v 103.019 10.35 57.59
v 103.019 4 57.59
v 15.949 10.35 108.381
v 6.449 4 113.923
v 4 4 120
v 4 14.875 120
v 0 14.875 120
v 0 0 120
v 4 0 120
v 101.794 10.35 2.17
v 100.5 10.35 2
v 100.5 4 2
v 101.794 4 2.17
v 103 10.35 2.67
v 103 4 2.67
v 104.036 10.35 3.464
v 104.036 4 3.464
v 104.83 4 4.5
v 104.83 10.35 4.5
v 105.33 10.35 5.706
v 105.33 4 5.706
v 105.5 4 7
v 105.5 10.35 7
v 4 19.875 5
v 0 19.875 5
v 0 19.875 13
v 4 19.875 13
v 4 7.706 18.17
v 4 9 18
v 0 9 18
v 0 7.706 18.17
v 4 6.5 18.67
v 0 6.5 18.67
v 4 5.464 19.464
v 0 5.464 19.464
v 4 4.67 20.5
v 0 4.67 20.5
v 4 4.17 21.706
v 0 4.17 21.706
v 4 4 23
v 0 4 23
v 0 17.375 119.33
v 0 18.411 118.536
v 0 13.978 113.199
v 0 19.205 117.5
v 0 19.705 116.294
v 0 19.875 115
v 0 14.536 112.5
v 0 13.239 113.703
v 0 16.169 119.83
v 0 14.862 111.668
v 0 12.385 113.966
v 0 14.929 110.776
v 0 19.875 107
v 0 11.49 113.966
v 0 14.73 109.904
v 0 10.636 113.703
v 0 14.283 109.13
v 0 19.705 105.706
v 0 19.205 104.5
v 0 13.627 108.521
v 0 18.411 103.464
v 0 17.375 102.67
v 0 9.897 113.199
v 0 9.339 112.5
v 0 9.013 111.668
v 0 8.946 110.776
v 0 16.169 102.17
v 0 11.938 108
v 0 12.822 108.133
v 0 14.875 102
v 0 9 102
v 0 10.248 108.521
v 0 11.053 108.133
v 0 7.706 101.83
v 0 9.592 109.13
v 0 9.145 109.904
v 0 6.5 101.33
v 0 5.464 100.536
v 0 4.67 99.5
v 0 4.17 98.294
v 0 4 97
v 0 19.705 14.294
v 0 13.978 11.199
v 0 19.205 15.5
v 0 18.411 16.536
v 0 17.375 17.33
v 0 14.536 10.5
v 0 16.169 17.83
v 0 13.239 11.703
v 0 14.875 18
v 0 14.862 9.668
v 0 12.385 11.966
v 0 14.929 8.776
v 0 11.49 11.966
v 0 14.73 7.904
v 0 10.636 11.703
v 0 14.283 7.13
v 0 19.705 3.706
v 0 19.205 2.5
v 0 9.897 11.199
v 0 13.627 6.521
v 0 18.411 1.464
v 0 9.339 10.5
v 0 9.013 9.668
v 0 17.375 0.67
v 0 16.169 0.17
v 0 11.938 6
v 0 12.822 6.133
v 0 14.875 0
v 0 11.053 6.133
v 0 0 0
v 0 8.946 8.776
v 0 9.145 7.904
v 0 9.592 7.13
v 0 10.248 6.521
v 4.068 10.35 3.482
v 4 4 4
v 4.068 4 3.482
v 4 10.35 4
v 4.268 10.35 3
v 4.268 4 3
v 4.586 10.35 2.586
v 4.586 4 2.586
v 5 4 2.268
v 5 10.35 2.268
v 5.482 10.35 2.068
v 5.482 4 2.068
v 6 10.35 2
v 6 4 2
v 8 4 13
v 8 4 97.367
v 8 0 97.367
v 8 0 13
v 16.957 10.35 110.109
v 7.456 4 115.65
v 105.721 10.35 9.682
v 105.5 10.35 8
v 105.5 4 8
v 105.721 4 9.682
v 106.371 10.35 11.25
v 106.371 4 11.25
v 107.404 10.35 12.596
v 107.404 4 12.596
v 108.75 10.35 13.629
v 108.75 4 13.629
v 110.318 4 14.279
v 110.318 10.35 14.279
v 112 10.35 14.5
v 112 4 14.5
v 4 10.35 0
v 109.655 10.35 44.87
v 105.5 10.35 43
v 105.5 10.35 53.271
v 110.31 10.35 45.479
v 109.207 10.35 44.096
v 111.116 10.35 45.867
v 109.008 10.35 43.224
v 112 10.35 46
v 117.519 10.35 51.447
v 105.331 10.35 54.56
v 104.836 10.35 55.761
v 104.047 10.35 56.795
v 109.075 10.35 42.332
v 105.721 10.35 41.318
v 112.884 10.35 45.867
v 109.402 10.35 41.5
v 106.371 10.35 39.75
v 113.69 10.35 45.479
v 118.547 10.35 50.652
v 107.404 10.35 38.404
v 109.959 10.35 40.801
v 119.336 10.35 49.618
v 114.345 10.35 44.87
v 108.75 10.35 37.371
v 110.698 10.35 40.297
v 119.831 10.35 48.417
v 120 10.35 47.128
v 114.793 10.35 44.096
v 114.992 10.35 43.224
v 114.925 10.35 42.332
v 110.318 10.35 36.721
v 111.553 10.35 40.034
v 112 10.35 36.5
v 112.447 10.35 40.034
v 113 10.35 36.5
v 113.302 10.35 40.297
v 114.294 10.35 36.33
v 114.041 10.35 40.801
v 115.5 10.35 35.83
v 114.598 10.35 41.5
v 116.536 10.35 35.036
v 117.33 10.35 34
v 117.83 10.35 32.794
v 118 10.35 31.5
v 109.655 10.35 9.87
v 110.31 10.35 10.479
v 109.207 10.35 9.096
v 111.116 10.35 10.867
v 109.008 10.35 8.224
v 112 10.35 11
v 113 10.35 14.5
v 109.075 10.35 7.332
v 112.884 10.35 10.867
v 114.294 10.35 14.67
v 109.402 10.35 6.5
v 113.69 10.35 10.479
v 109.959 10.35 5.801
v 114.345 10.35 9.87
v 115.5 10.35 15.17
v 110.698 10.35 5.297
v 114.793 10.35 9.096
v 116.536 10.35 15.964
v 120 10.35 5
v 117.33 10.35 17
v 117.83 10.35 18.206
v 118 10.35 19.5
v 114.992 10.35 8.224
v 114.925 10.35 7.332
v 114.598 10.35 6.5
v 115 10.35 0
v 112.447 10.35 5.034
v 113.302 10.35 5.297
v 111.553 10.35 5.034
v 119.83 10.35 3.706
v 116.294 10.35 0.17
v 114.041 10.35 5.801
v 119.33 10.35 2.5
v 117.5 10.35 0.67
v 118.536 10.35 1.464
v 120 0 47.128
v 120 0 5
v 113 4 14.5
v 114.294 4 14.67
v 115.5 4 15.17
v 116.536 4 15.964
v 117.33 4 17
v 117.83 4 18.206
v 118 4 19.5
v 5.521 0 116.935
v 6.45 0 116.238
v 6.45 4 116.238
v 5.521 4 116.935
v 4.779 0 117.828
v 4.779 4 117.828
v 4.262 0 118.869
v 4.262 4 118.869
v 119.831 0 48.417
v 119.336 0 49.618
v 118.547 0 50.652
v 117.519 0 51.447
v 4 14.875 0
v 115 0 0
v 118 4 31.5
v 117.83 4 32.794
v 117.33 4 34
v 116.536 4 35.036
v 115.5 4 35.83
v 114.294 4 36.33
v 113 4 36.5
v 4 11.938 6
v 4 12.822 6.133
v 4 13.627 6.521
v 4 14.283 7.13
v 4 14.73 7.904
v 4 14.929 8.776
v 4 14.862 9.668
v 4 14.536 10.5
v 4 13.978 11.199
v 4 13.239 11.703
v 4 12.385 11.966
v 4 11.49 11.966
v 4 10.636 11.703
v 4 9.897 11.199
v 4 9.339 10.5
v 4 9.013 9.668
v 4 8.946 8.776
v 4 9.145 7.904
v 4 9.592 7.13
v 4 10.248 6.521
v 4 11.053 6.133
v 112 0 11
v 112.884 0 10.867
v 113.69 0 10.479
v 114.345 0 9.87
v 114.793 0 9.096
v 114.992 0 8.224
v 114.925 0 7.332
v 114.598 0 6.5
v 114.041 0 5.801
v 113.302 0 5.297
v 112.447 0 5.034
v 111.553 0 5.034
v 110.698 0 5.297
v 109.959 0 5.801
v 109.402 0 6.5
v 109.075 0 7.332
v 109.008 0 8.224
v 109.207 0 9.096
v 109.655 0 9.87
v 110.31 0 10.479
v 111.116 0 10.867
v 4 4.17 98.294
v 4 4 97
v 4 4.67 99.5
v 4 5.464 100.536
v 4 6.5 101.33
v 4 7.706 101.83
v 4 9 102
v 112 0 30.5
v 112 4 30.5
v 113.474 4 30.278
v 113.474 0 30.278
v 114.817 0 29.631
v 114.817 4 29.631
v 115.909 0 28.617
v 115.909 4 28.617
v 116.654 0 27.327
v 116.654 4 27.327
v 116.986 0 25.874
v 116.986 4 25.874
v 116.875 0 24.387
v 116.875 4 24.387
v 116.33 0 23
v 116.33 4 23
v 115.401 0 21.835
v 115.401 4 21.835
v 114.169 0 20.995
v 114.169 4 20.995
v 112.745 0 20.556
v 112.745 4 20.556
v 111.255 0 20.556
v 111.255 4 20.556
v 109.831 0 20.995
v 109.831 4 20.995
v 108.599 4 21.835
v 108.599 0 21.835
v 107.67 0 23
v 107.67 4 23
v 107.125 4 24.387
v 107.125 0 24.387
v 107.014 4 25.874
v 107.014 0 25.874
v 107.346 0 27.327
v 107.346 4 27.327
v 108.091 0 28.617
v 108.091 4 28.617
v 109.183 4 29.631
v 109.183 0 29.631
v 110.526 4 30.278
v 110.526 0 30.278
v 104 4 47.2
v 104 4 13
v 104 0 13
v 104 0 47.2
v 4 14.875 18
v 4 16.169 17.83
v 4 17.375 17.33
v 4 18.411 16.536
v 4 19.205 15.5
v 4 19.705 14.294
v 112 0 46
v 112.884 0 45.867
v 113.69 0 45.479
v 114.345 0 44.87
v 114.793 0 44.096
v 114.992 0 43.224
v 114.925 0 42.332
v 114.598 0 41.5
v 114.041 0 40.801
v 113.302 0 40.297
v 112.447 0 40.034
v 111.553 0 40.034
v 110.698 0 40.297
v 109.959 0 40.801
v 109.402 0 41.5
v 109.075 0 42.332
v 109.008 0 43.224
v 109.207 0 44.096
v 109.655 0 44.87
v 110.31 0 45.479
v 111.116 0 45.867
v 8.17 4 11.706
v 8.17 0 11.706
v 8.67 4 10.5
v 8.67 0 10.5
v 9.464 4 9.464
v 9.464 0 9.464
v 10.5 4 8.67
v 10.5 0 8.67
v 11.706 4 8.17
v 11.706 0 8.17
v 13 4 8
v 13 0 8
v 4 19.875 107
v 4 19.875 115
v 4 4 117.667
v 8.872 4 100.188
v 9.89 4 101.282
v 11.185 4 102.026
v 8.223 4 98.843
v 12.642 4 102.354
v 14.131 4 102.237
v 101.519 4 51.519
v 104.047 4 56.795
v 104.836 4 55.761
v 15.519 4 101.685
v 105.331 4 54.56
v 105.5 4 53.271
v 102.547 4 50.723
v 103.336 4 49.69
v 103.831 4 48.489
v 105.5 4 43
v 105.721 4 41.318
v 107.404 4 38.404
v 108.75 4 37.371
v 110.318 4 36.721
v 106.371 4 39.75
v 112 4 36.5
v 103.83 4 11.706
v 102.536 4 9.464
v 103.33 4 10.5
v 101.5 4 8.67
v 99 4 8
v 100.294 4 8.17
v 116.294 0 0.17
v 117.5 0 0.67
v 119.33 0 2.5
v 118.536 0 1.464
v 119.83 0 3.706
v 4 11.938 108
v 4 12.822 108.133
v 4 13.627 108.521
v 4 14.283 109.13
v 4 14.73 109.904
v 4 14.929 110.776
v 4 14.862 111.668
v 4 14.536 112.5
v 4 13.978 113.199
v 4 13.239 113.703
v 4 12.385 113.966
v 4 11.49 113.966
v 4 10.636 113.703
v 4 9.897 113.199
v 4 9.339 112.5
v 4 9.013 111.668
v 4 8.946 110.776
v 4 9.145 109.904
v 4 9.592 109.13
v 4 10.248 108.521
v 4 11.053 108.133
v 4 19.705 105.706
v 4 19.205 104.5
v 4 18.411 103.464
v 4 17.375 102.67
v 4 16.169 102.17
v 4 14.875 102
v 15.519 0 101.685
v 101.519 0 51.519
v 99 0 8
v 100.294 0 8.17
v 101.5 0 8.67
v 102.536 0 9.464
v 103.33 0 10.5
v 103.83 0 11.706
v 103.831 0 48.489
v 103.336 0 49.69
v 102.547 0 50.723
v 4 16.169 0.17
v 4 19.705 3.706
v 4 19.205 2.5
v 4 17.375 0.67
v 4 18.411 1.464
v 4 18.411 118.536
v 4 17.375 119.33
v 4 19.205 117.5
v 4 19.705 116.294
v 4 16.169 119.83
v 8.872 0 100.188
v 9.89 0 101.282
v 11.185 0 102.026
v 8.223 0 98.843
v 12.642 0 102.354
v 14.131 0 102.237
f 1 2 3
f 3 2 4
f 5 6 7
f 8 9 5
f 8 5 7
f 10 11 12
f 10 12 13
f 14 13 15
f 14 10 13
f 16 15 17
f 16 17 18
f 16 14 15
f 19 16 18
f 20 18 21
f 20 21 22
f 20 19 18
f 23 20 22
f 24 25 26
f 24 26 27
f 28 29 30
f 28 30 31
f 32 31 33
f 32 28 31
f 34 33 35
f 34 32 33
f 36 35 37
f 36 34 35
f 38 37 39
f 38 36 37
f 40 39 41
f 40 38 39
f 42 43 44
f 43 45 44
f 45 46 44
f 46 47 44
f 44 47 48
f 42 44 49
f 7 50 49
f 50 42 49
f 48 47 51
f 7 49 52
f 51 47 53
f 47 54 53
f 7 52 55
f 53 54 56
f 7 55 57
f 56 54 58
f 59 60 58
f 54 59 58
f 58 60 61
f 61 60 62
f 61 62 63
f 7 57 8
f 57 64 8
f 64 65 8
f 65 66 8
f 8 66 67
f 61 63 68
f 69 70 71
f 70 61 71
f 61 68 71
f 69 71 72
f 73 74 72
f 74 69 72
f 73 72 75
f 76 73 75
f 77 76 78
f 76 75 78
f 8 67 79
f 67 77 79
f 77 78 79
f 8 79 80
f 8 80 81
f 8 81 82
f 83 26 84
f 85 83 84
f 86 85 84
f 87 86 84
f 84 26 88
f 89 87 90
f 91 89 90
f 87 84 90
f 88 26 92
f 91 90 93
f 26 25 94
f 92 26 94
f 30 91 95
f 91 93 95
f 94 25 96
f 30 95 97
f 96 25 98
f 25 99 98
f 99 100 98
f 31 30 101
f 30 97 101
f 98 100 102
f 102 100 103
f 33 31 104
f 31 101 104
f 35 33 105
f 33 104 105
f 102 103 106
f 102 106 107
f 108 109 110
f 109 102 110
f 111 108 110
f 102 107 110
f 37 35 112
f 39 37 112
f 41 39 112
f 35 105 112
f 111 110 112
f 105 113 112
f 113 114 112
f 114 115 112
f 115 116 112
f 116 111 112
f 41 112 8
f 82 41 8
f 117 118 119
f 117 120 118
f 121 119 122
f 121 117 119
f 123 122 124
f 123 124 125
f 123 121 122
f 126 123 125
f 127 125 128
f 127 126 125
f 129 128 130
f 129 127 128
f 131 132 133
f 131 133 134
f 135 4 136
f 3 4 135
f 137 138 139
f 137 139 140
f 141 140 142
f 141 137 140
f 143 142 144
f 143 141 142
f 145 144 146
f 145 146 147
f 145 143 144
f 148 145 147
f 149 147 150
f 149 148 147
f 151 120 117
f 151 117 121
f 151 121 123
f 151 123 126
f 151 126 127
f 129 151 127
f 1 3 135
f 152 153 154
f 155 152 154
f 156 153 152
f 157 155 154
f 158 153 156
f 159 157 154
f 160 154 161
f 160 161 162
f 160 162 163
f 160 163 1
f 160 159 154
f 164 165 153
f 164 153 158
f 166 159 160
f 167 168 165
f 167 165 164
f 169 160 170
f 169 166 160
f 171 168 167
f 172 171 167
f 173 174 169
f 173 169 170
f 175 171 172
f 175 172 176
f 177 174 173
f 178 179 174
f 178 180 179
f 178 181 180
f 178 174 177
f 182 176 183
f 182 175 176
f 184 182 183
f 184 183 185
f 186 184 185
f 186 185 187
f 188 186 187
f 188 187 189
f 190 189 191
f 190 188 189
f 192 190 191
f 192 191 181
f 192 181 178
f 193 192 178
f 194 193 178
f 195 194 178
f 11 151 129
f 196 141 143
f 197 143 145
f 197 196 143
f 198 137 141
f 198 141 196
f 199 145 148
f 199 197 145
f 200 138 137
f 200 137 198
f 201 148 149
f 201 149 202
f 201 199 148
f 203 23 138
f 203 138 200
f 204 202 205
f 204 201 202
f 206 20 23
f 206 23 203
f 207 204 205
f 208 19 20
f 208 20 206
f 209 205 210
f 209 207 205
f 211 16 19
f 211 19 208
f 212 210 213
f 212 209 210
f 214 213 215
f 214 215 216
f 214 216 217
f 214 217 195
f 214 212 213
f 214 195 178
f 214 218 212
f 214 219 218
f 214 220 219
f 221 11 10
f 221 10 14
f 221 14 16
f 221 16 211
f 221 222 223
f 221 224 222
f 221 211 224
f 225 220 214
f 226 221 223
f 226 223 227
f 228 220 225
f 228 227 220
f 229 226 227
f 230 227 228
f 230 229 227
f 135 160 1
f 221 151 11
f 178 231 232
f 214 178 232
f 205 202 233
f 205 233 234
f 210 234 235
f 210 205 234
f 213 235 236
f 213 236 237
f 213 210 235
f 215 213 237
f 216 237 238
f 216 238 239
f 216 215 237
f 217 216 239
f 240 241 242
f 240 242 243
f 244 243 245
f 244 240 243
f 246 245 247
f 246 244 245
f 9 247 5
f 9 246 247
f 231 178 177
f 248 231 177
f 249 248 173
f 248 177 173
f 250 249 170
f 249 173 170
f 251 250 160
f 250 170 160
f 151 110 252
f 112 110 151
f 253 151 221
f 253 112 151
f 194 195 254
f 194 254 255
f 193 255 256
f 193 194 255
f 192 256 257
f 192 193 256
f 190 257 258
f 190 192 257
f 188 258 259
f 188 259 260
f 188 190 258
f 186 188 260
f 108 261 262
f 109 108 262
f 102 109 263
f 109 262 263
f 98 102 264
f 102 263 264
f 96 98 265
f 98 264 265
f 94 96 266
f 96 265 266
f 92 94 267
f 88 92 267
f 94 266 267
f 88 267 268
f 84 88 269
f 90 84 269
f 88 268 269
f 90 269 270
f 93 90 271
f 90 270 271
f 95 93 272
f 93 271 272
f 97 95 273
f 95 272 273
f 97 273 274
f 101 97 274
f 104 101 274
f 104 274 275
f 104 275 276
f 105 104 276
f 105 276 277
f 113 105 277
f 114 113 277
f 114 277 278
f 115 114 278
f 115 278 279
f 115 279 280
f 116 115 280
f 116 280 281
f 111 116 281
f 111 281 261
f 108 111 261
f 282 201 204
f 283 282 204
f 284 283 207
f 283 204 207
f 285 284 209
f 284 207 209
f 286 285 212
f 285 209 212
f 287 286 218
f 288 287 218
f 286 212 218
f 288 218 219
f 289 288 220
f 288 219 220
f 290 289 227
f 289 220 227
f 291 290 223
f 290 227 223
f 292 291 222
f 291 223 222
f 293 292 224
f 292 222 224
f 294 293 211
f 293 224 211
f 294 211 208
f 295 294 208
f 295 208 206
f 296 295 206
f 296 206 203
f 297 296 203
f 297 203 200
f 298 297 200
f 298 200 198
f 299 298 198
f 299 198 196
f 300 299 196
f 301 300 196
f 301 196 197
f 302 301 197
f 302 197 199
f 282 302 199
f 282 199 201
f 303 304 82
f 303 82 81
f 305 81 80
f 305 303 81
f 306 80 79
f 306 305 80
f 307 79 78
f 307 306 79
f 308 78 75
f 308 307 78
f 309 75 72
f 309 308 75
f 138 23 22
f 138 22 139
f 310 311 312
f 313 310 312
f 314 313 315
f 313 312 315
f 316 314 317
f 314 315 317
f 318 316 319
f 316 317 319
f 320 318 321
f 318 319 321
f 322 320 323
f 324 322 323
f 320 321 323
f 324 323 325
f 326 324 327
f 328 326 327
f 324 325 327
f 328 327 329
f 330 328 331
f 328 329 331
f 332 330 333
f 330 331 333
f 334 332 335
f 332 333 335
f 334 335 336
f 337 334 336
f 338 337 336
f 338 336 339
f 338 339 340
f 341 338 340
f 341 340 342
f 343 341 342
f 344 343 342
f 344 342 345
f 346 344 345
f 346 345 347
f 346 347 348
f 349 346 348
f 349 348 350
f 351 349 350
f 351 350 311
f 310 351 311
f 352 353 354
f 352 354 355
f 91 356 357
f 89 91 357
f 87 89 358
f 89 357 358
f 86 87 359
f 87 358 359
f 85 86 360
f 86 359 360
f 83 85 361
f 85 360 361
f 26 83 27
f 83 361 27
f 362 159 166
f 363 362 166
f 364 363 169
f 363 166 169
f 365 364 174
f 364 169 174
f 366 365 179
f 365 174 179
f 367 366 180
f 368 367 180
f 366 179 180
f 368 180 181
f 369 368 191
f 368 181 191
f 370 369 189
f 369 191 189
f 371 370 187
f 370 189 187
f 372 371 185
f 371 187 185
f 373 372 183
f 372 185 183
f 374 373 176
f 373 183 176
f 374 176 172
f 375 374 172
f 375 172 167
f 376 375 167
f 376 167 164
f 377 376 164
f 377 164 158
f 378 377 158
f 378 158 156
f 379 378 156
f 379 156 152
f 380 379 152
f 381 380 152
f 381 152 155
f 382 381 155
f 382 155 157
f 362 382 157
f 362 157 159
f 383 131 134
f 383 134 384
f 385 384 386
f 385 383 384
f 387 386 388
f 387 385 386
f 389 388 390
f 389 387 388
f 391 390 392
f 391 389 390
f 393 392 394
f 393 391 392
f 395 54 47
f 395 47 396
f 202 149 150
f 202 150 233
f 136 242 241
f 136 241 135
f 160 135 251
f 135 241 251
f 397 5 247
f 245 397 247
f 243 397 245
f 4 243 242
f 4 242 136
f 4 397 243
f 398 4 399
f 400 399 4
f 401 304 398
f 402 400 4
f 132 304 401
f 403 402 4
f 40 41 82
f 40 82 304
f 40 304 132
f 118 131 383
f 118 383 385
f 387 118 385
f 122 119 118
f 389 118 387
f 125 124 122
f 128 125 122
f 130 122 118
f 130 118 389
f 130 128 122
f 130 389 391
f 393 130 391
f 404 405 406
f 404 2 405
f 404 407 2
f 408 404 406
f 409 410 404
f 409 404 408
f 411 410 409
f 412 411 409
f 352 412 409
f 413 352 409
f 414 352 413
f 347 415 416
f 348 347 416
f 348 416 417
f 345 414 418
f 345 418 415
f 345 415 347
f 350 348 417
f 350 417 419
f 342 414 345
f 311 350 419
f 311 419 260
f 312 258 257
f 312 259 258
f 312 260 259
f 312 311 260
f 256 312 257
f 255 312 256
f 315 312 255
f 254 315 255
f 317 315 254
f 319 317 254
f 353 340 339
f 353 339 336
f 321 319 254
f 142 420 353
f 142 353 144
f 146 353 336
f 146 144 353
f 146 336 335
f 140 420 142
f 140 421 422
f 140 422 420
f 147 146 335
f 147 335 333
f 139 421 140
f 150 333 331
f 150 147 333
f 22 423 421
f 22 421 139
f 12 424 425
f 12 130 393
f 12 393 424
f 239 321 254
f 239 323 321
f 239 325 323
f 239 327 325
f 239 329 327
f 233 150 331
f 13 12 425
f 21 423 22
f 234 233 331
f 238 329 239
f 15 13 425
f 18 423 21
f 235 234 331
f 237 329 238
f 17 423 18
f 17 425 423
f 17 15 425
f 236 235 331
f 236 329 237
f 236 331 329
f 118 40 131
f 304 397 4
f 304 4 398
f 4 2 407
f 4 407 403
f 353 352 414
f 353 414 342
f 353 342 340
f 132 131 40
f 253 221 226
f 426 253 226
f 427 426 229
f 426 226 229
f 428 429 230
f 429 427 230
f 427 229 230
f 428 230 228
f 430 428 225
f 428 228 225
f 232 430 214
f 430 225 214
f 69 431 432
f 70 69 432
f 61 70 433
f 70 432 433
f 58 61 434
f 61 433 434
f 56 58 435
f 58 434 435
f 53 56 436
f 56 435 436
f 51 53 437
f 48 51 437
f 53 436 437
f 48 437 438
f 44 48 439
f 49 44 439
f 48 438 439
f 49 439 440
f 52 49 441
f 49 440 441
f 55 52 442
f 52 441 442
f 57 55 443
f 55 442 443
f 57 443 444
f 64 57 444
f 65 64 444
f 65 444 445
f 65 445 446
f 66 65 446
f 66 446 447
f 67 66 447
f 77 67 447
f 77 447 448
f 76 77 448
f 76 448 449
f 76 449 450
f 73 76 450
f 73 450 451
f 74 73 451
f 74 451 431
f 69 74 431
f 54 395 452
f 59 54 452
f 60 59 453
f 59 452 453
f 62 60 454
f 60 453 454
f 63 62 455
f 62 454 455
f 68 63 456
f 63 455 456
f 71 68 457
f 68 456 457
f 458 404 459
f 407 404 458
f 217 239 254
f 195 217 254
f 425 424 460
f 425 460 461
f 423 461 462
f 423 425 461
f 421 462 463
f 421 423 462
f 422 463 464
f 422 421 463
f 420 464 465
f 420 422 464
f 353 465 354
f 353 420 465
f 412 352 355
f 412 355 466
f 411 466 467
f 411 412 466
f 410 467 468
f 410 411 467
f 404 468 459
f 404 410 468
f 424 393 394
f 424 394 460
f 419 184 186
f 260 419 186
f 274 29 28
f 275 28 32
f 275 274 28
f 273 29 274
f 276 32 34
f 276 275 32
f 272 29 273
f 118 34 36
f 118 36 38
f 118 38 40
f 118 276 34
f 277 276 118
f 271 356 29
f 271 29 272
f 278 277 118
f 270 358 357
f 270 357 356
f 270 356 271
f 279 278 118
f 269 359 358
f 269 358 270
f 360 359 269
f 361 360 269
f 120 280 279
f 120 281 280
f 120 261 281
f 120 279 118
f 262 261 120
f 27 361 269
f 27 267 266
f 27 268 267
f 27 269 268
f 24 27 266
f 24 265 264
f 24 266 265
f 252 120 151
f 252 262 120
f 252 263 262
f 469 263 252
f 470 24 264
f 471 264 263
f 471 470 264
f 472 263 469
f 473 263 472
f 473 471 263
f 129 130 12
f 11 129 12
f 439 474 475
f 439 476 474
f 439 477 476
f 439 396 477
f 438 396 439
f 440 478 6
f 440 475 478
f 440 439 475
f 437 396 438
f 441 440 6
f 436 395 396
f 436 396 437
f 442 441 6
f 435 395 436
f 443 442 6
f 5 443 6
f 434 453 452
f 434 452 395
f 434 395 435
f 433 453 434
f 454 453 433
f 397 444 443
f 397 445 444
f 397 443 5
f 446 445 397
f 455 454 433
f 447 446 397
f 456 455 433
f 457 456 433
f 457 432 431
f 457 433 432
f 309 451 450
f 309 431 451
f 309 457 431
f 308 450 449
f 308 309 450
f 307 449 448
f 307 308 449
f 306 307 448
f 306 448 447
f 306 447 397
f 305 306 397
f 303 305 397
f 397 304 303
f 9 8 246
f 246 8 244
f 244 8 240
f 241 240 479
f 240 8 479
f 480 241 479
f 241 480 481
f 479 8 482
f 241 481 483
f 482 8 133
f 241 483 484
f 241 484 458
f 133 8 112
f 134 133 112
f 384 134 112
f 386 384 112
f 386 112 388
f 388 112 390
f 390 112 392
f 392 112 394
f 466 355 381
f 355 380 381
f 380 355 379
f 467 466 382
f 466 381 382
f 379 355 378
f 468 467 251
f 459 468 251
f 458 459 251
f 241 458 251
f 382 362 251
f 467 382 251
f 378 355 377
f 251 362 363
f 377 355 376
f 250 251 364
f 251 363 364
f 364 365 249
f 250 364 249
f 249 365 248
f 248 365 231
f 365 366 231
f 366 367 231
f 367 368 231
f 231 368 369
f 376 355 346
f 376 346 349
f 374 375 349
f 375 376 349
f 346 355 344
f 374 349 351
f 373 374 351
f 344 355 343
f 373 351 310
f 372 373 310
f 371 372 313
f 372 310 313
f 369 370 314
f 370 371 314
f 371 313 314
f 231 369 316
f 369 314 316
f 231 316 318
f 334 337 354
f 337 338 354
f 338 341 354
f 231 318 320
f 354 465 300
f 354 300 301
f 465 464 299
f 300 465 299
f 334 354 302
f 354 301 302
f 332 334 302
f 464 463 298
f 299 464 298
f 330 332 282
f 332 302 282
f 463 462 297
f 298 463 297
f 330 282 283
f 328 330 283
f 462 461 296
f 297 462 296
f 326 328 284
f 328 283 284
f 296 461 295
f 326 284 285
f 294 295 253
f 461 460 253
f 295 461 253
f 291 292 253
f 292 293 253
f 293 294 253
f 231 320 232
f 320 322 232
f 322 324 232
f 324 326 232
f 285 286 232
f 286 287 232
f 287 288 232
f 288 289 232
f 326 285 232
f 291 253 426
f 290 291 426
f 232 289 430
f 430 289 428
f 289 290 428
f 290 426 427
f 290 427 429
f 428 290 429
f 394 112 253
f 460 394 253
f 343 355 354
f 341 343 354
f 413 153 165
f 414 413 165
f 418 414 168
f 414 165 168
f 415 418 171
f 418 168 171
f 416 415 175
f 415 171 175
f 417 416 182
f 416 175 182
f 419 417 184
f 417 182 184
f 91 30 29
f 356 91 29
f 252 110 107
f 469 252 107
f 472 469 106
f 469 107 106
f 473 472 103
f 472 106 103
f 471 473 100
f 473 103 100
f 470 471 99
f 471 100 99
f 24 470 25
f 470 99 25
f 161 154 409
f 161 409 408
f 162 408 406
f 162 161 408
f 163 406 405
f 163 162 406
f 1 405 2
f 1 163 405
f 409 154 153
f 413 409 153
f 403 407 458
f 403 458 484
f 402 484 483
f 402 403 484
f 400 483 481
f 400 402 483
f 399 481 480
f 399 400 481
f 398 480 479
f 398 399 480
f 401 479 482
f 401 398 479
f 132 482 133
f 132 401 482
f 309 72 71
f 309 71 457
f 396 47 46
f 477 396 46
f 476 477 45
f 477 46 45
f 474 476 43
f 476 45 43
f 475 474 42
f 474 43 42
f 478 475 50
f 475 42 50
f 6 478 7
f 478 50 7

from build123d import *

# Parameters (mm, degrees)
BOSS_EXTRUDE1_DEPTH = 4
SKETCH2_R           = 3
CUT_EXTRUDE3_DEPTH  = 170.752761391
BOSS_EXTRUDE3_DEPTH = 6.35
CHAMFER1_SIZE       = 8.660254038
CHAMFER1_SIZE_2     = 15
BOSS_EXTRUDE4_START = 6.35
SKETCH8_R           = 3
BOSS_EXTRUDE4_DEPTH = 6.35
SKETCH9_W           = 4
SKETCH9_H           = 18
BOSS_EXTRUDE5_DEPTH = 15.875
SKETCH10_R          = 3
CUT_EXTRUDE4_DEPTH  = 110.875
FILLET3_R           = 5
SKETCH11_R          = 5
CUT_EXTRUDE5_DEPTH  = 15.875
FILLET4_R           = 2


with BuildPart() as part:
    # Sketch1 → Boss-Extrude1 (new body)
    with BuildSketch(Plane(origin=(0, 0, 0), x_dir=(1, 0, 0), z_dir=(0, 1, 0))):
        Polygon((0, 0), (120, 0), (120, -50), (4, -117.666666667), (4, -120), (0, -120), align=None)
    extrude(amount=BOSS_EXTRUDE1_DEPTH)

    # Sketch2 → Cut-Extrude3 (cut, through all)
    with BuildSketch(Plane(origin=(0, 4, 0), x_dir=(1, 0, 0), z_dir=(0, 1, 0))):
        with Locations(Location((112, -8, 0), (0, 0, 270))):
            Circle(SKETCH2_R)
        with Locations(Location((112, -43, 0), (0, 0, 270))):
            Circle(SKETCH2_R)
        Polygon((104, -8), (104, -50.071704007), (8, -106.071704007), (8, -8), align=None)
    extrude(amount=-CUT_EXTRUDE3_DEPTH, mode=Mode.SUBTRACT)

    # Sketch7 → Boss-Extrude3 (add)
    with BuildSketch(Plane(origin=(0, 4, 0), x_dir=(1, 0, 0), z_dir=(0, 1, 0))):
        Polygon((118, -48.851259335), (2.992257949, -115.939108865), (4, -117.666666667), (120, -50), (120, 0), (2.992257949, 0), (2.992257949, -2), (118, -2), align=None)
    extrude(amount=BOSS_EXTRUDE3_DEPTH)

    # Chamfer1
    # the kernel refuses this chamfer: 15, 8.660254038 mm, written as the material it takes off along each edge
    with BuildSketch(Plane(origin=(-16.561105336, 10.35, 82.41905752), x_dir=(0, -1, 0), z_dir=(0.5038710255240854, 0, 0.863778900898434))) as chamfer1_piece_1_section:
        Polygon((CHAMFER1_SIZE, 0), (0, CHAMFER1_SIZE_2), (0, 0), align=None)
    chamfer1_piece_1 = extrude(amount=79.612572639, mode=Mode.PRIVATE)
    chamfer1_piece_1 = split(chamfer1_piece_1, bisect_by=Plane(origin=(-16.561105336, 4, 82.41905752), z_dir=(0, 1, 0)), keep=Keep.TOP, mode=Mode.PRIVATE)
    add(chamfer1_piece_1, mode=Mode.SUBTRACT)

    # Sketch8 → Boss-Extrude4 (add)
    # profile 1 of 2: a face of its own
    with BuildSketch(Plane(origin=(0, 4, 0), x_dir=(1, 0, 0), z_dir=(0, 1, 0)).offset(BOSS_EXTRUDE4_START)):
        with BuildLine():
            Line((112, -14.5), (118, -14.5))
            Line((118, -14.5), (118, -2))
            Line((118, -2), (105.5, -2))
            Line((105.5, -2), (105.5, -8))
            ThreePointArc((105.5, -8), (107.403805922, -12.596194078), (112, -14.5))
        make_face()
        with Locations(Location((112, -8, 0), (0, 0, 270))):
            Circle(SKETCH8_R, mode=Mode.SUBTRACT)
    # profile 2 of 2: a face of its own
    with BuildSketch(Plane(origin=(0, 4, 0), x_dir=(1, 0, 0), z_dir=(0, 1, 0)).offset(BOSS_EXTRUDE4_START)):
        with BuildLine():
            Line((112, -36.5), (118, -36.5))
            Line((118, -36.5), (118, -48.851259335))
            Line((118, -48.851259335), (105.5, -56.142926002))
            Line((105.5, -56.142926002), (105.5, -43))
            ThreePointArc((105.5, -43), (107.403805922, -38.403805922), (112, -36.5))
        make_face()
        with Locations(Location((112, -43, 0), (0, 0, 270))):
            Circle(SKETCH8_R, mode=Mode.SUBTRACT)
    extrude(amount=-BOSS_EXTRUDE4_DEPTH)

    # Sketch9 → Boss-Extrude5 (add)
    with BuildSketch(Plane(origin=(0, 4, 0), x_dir=(1, 0, 0), z_dir=(0, 1, 0))):
        with Locations((2, -9)):
            Rectangle(SKETCH9_W, SKETCH9_H)
        with Locations((2, -111)):
            Rectangle(SKETCH9_W, SKETCH9_H)
    extrude(amount=BOSS_EXTRUDE5_DEPTH)

    # Sketch10 → Cut-Extrude4 (cut)
    with BuildSketch(Plane(origin=(4, 0, 0), x_dir=(0, 0, -1), z_dir=(1, 0, 0))):
        with Locations((-9, 11.9375)):
            Circle(SKETCH10_R)
        with Locations((-111, 11.9375)):
            Circle(SKETCH10_R)
    extrude(amount=-CUT_EXTRUDE4_DEPTH, mode=Mode.SUBTRACT)

    # Fillet3
    # the kernel refuses this fillet: 5 mm, written as the material it adds along each edge
    with BuildSketch(Plane(origin=(105.5, 10.35, 56.142926002), x_dir=(-0.863778900898437, 0, 0.50387102552408), z_dir=(0, -1, 0))) as fillet3_piece_1:
        with BuildLine():
            CenterArc((FILLET3_R * 0.574370332454, FILLET3_R), FILLET3_R, 210.256437164, 59.743562836)
            Line((-FILLET3_R * 0.289408568444, FILLET3_R * 0.496128974476), (0, 0))
            Line((0, 0), (FILLET3_R * 0.574370332454, 0))
        make_face()
    extrude(amount=6.35)
    with BuildSketch(Plane(origin=(118, 10.35, 36.5), x_dir=(-1, 0, 0), z_dir=(0, -1, 0))) as fillet3_piece_2:
        with BuildLine():
            CenterArc((FILLET3_R, FILLET3_R), FILLET3_R, 180, 90)
            Line((0, FILLET3_R), (0, 0))
            Line((0, 0), (FILLET3_R, 0))
        make_face()
    extrude(amount=6.35)
    with BuildSketch(Plane(origin=(118, 10.35, 14.5), x_dir=(-1, 0, 0), z_dir=(0, -1, 0)), Plane(origin=(105.5, 10.35, 2), x_dir=(-1, 0, 0), z_dir=(0, -1, 0))) as fillet3_piece_3:
        with BuildLine():
            CenterArc((FILLET3_R, -FILLET3_R), FILLET3_R, 90, 90)
            Line((0, -FILLET3_R), (0, 0))
            Line((0, 0), (FILLET3_R, 0))
        make_face()
    extrude(amount=6.35)
    with BuildSketch(Plane(origin=(4, 0, 117.666666667), x_dir=(0.863778900898435, 0, -0.5038710255240835), z_dir=(0, 1, 0))) as fillet3_piece_4:
        with BuildLine():
            CenterArc((2.835867325, -5), FILLET3_R, 90, 53.351575298)
            Line((-1.17569906, -2.015484102), (0, 0))
            Line((0, 0), (2.835867325, 0))
        make_face()
    extrude(amount=4)
    with BuildSketch(Plane(origin=(8, 4, 106.071704007), x_dir=(0.8637789008984339, 0, -0.5038710255240852), z_dir=(0, -1, 0))) as fillet3_piece_5:
        with BuildLine():
            CenterArc((FILLET3_R * 1.74103699912, -FILLET3_R), FILLET3_R, 90, 120.256437164)
            Line((FILLET3_R * 0.877258098222, -FILLET3_R * 1.50387102552), (0, 0))
            Line((0, 0), (FILLET3_R * 1.74103699912, 0))
        make_face()
    extrude(amount=4)
    with BuildSketch(Plane(origin=(104, 4, 50.071704007), x_dir=(-0.8637789008984337, 0, 0.5038710255240859), z_dir=(0, -1, 0))) as fillet3_piece_6:
        with BuildLine():
            CenterArc((FILLET3_R * 0.574370332454, FILLET3_R), FILLET3_R, 210.256437164, 59.743562836)
            Line((-FILLET3_R * 0.289408568444, FILLET3_R * 0.496128974476), (0, 0))
            Line((0, 0), (FILLET3_R * 0.574370332454, 0))
        make_face()
    extrude(amount=4)
    with BuildSketch(Plane(origin=(104, 4, 8), x_dir=(-1, 0, 0), z_dir=(0, -1, 0)), Plane(origin=(8, 4, 8), x_dir=(0, 0, 1), z_dir=(0, -1, 0))) as fillet3_piece_7:
        with BuildLine():
            CenterArc((FILLET3_R, -FILLET3_R), FILLET3_R, 90, 90)
            Line((0, -FILLET3_R), (0, 0))
            Line((0, 0), (FILLET3_R, 0))
        make_face()
    extrude(amount=4)
    with BuildSketch(Plane(origin=(4, 4, 102), x_dir=(0, 1, 0), z_dir=(-1, 0, 0)), Plane(origin=(4, 4, 18), x_dir=(0, 0, 1), z_dir=(-1, 0, 0))) as fillet3_piece_8:
        with BuildLine():
            CenterArc((FILLET3_R, FILLET3_R), FILLET3_R, 180, 90)
            Line((0, FILLET3_R), (0, 0))
            Line((0, 0), (FILLET3_R, 0))
        make_face()
    extrude(amount=4)
    # the kernel refuses this fillet: 5 mm, written as the material it takes off along each edge
    with BuildSketch(Plane(origin=(120, 22.85, 0), x_dir=(-1, 0, 0), z_dir=(0, -1, 0))) as fillet3_2_piece_1:
        with BuildLine():
            CenterArc((FILLET3_R, -FILLET3_R), FILLET3_R, 90, 90)
            Line((0, -FILLET3_R), (0, 0))
            Line((0, 0), (FILLET3_R, 0))
        make_face()
    extrude(amount=35.35, mode=Mode.SUBTRACT)
    with BuildSketch(Plane(origin=(120, 17.529629156, 50), x_dir=(0, 0, -1), z_dir=(0, -1, 0))) as fillet3_2_piece_2:
        with BuildLine():
            CenterArc((FILLET3_R * 0.574370332454, -FILLET3_R), FILLET3_R, 90, 59.743562836)
            Line((-FILLET3_R * 0.289408568444, -FILLET3_R * 0.496128974476), (0, 0))
            Line((0, 0), (FILLET3_R * 0.574370332454, 0))
        make_face()
    extrude(amount=24.709258311, mode=Mode.SUBTRACT)
    with BuildSketch(Plane(origin=(-12.5, 19.875, 120), x_dir=(0, 0, -1), z_dir=(1, 0, 0)), Plane(origin=(-12.5, 19.875, 0), x_dir=(0, -1, 0), z_dir=(1, 0, 0)), Plane(origin=(16.5, 19.875, 18), x_dir=(0, -1, 0), z_dir=(-1, 0, 0))) as fillet3_2_piece_3:
        with BuildLine():
            CenterArc((FILLET3_R, -FILLET3_R), FILLET3_R, 90, 90)
            Line((0, -FILLET3_R), (0, 0))
            Line((0, 0), (FILLET3_R, 0))
        make_face()
    extrude(amount=29, mode=Mode.SUBTRACT)
    with BuildSketch(Plane(origin=(16.5, 19.875, 102), x_dir=(0, -1, 0), z_dir=(-1, 0, 0))) as fillet3_2_piece_4:
        with BuildLine():
            CenterArc((FILLET3_R, FILLET3_R), FILLET3_R, 180, 90)
            Line((0, FILLET3_R), (0, 0))
            Line((0, 0), (FILLET3_R, 0))
        make_face()
    extrude(amount=29, mode=Mode.SUBTRACT)

    # Sketch11 → Cut-Extrude5 (cut)
    with BuildSketch(Plane(origin=(0, 4, 0), x_dir=(1, 0, 0), z_dir=(0, 1, 0))):
        with Locations(Location((112, -25.5, 0), (0, 0, 270))):
            Circle(SKETCH11_R)
    extrude(amount=-CUT_EXTRUDE5_DEPTH, mode=Mode.SUBTRACT)

    # Fillet4
    fillet4_edges = [part.edges().sort_by_distance(p)[0] for p in [
        (4, 7.175, 2),
    ]]
    fillet(fillet4_edges, radius=FILLET4_R)


solid = part.part
